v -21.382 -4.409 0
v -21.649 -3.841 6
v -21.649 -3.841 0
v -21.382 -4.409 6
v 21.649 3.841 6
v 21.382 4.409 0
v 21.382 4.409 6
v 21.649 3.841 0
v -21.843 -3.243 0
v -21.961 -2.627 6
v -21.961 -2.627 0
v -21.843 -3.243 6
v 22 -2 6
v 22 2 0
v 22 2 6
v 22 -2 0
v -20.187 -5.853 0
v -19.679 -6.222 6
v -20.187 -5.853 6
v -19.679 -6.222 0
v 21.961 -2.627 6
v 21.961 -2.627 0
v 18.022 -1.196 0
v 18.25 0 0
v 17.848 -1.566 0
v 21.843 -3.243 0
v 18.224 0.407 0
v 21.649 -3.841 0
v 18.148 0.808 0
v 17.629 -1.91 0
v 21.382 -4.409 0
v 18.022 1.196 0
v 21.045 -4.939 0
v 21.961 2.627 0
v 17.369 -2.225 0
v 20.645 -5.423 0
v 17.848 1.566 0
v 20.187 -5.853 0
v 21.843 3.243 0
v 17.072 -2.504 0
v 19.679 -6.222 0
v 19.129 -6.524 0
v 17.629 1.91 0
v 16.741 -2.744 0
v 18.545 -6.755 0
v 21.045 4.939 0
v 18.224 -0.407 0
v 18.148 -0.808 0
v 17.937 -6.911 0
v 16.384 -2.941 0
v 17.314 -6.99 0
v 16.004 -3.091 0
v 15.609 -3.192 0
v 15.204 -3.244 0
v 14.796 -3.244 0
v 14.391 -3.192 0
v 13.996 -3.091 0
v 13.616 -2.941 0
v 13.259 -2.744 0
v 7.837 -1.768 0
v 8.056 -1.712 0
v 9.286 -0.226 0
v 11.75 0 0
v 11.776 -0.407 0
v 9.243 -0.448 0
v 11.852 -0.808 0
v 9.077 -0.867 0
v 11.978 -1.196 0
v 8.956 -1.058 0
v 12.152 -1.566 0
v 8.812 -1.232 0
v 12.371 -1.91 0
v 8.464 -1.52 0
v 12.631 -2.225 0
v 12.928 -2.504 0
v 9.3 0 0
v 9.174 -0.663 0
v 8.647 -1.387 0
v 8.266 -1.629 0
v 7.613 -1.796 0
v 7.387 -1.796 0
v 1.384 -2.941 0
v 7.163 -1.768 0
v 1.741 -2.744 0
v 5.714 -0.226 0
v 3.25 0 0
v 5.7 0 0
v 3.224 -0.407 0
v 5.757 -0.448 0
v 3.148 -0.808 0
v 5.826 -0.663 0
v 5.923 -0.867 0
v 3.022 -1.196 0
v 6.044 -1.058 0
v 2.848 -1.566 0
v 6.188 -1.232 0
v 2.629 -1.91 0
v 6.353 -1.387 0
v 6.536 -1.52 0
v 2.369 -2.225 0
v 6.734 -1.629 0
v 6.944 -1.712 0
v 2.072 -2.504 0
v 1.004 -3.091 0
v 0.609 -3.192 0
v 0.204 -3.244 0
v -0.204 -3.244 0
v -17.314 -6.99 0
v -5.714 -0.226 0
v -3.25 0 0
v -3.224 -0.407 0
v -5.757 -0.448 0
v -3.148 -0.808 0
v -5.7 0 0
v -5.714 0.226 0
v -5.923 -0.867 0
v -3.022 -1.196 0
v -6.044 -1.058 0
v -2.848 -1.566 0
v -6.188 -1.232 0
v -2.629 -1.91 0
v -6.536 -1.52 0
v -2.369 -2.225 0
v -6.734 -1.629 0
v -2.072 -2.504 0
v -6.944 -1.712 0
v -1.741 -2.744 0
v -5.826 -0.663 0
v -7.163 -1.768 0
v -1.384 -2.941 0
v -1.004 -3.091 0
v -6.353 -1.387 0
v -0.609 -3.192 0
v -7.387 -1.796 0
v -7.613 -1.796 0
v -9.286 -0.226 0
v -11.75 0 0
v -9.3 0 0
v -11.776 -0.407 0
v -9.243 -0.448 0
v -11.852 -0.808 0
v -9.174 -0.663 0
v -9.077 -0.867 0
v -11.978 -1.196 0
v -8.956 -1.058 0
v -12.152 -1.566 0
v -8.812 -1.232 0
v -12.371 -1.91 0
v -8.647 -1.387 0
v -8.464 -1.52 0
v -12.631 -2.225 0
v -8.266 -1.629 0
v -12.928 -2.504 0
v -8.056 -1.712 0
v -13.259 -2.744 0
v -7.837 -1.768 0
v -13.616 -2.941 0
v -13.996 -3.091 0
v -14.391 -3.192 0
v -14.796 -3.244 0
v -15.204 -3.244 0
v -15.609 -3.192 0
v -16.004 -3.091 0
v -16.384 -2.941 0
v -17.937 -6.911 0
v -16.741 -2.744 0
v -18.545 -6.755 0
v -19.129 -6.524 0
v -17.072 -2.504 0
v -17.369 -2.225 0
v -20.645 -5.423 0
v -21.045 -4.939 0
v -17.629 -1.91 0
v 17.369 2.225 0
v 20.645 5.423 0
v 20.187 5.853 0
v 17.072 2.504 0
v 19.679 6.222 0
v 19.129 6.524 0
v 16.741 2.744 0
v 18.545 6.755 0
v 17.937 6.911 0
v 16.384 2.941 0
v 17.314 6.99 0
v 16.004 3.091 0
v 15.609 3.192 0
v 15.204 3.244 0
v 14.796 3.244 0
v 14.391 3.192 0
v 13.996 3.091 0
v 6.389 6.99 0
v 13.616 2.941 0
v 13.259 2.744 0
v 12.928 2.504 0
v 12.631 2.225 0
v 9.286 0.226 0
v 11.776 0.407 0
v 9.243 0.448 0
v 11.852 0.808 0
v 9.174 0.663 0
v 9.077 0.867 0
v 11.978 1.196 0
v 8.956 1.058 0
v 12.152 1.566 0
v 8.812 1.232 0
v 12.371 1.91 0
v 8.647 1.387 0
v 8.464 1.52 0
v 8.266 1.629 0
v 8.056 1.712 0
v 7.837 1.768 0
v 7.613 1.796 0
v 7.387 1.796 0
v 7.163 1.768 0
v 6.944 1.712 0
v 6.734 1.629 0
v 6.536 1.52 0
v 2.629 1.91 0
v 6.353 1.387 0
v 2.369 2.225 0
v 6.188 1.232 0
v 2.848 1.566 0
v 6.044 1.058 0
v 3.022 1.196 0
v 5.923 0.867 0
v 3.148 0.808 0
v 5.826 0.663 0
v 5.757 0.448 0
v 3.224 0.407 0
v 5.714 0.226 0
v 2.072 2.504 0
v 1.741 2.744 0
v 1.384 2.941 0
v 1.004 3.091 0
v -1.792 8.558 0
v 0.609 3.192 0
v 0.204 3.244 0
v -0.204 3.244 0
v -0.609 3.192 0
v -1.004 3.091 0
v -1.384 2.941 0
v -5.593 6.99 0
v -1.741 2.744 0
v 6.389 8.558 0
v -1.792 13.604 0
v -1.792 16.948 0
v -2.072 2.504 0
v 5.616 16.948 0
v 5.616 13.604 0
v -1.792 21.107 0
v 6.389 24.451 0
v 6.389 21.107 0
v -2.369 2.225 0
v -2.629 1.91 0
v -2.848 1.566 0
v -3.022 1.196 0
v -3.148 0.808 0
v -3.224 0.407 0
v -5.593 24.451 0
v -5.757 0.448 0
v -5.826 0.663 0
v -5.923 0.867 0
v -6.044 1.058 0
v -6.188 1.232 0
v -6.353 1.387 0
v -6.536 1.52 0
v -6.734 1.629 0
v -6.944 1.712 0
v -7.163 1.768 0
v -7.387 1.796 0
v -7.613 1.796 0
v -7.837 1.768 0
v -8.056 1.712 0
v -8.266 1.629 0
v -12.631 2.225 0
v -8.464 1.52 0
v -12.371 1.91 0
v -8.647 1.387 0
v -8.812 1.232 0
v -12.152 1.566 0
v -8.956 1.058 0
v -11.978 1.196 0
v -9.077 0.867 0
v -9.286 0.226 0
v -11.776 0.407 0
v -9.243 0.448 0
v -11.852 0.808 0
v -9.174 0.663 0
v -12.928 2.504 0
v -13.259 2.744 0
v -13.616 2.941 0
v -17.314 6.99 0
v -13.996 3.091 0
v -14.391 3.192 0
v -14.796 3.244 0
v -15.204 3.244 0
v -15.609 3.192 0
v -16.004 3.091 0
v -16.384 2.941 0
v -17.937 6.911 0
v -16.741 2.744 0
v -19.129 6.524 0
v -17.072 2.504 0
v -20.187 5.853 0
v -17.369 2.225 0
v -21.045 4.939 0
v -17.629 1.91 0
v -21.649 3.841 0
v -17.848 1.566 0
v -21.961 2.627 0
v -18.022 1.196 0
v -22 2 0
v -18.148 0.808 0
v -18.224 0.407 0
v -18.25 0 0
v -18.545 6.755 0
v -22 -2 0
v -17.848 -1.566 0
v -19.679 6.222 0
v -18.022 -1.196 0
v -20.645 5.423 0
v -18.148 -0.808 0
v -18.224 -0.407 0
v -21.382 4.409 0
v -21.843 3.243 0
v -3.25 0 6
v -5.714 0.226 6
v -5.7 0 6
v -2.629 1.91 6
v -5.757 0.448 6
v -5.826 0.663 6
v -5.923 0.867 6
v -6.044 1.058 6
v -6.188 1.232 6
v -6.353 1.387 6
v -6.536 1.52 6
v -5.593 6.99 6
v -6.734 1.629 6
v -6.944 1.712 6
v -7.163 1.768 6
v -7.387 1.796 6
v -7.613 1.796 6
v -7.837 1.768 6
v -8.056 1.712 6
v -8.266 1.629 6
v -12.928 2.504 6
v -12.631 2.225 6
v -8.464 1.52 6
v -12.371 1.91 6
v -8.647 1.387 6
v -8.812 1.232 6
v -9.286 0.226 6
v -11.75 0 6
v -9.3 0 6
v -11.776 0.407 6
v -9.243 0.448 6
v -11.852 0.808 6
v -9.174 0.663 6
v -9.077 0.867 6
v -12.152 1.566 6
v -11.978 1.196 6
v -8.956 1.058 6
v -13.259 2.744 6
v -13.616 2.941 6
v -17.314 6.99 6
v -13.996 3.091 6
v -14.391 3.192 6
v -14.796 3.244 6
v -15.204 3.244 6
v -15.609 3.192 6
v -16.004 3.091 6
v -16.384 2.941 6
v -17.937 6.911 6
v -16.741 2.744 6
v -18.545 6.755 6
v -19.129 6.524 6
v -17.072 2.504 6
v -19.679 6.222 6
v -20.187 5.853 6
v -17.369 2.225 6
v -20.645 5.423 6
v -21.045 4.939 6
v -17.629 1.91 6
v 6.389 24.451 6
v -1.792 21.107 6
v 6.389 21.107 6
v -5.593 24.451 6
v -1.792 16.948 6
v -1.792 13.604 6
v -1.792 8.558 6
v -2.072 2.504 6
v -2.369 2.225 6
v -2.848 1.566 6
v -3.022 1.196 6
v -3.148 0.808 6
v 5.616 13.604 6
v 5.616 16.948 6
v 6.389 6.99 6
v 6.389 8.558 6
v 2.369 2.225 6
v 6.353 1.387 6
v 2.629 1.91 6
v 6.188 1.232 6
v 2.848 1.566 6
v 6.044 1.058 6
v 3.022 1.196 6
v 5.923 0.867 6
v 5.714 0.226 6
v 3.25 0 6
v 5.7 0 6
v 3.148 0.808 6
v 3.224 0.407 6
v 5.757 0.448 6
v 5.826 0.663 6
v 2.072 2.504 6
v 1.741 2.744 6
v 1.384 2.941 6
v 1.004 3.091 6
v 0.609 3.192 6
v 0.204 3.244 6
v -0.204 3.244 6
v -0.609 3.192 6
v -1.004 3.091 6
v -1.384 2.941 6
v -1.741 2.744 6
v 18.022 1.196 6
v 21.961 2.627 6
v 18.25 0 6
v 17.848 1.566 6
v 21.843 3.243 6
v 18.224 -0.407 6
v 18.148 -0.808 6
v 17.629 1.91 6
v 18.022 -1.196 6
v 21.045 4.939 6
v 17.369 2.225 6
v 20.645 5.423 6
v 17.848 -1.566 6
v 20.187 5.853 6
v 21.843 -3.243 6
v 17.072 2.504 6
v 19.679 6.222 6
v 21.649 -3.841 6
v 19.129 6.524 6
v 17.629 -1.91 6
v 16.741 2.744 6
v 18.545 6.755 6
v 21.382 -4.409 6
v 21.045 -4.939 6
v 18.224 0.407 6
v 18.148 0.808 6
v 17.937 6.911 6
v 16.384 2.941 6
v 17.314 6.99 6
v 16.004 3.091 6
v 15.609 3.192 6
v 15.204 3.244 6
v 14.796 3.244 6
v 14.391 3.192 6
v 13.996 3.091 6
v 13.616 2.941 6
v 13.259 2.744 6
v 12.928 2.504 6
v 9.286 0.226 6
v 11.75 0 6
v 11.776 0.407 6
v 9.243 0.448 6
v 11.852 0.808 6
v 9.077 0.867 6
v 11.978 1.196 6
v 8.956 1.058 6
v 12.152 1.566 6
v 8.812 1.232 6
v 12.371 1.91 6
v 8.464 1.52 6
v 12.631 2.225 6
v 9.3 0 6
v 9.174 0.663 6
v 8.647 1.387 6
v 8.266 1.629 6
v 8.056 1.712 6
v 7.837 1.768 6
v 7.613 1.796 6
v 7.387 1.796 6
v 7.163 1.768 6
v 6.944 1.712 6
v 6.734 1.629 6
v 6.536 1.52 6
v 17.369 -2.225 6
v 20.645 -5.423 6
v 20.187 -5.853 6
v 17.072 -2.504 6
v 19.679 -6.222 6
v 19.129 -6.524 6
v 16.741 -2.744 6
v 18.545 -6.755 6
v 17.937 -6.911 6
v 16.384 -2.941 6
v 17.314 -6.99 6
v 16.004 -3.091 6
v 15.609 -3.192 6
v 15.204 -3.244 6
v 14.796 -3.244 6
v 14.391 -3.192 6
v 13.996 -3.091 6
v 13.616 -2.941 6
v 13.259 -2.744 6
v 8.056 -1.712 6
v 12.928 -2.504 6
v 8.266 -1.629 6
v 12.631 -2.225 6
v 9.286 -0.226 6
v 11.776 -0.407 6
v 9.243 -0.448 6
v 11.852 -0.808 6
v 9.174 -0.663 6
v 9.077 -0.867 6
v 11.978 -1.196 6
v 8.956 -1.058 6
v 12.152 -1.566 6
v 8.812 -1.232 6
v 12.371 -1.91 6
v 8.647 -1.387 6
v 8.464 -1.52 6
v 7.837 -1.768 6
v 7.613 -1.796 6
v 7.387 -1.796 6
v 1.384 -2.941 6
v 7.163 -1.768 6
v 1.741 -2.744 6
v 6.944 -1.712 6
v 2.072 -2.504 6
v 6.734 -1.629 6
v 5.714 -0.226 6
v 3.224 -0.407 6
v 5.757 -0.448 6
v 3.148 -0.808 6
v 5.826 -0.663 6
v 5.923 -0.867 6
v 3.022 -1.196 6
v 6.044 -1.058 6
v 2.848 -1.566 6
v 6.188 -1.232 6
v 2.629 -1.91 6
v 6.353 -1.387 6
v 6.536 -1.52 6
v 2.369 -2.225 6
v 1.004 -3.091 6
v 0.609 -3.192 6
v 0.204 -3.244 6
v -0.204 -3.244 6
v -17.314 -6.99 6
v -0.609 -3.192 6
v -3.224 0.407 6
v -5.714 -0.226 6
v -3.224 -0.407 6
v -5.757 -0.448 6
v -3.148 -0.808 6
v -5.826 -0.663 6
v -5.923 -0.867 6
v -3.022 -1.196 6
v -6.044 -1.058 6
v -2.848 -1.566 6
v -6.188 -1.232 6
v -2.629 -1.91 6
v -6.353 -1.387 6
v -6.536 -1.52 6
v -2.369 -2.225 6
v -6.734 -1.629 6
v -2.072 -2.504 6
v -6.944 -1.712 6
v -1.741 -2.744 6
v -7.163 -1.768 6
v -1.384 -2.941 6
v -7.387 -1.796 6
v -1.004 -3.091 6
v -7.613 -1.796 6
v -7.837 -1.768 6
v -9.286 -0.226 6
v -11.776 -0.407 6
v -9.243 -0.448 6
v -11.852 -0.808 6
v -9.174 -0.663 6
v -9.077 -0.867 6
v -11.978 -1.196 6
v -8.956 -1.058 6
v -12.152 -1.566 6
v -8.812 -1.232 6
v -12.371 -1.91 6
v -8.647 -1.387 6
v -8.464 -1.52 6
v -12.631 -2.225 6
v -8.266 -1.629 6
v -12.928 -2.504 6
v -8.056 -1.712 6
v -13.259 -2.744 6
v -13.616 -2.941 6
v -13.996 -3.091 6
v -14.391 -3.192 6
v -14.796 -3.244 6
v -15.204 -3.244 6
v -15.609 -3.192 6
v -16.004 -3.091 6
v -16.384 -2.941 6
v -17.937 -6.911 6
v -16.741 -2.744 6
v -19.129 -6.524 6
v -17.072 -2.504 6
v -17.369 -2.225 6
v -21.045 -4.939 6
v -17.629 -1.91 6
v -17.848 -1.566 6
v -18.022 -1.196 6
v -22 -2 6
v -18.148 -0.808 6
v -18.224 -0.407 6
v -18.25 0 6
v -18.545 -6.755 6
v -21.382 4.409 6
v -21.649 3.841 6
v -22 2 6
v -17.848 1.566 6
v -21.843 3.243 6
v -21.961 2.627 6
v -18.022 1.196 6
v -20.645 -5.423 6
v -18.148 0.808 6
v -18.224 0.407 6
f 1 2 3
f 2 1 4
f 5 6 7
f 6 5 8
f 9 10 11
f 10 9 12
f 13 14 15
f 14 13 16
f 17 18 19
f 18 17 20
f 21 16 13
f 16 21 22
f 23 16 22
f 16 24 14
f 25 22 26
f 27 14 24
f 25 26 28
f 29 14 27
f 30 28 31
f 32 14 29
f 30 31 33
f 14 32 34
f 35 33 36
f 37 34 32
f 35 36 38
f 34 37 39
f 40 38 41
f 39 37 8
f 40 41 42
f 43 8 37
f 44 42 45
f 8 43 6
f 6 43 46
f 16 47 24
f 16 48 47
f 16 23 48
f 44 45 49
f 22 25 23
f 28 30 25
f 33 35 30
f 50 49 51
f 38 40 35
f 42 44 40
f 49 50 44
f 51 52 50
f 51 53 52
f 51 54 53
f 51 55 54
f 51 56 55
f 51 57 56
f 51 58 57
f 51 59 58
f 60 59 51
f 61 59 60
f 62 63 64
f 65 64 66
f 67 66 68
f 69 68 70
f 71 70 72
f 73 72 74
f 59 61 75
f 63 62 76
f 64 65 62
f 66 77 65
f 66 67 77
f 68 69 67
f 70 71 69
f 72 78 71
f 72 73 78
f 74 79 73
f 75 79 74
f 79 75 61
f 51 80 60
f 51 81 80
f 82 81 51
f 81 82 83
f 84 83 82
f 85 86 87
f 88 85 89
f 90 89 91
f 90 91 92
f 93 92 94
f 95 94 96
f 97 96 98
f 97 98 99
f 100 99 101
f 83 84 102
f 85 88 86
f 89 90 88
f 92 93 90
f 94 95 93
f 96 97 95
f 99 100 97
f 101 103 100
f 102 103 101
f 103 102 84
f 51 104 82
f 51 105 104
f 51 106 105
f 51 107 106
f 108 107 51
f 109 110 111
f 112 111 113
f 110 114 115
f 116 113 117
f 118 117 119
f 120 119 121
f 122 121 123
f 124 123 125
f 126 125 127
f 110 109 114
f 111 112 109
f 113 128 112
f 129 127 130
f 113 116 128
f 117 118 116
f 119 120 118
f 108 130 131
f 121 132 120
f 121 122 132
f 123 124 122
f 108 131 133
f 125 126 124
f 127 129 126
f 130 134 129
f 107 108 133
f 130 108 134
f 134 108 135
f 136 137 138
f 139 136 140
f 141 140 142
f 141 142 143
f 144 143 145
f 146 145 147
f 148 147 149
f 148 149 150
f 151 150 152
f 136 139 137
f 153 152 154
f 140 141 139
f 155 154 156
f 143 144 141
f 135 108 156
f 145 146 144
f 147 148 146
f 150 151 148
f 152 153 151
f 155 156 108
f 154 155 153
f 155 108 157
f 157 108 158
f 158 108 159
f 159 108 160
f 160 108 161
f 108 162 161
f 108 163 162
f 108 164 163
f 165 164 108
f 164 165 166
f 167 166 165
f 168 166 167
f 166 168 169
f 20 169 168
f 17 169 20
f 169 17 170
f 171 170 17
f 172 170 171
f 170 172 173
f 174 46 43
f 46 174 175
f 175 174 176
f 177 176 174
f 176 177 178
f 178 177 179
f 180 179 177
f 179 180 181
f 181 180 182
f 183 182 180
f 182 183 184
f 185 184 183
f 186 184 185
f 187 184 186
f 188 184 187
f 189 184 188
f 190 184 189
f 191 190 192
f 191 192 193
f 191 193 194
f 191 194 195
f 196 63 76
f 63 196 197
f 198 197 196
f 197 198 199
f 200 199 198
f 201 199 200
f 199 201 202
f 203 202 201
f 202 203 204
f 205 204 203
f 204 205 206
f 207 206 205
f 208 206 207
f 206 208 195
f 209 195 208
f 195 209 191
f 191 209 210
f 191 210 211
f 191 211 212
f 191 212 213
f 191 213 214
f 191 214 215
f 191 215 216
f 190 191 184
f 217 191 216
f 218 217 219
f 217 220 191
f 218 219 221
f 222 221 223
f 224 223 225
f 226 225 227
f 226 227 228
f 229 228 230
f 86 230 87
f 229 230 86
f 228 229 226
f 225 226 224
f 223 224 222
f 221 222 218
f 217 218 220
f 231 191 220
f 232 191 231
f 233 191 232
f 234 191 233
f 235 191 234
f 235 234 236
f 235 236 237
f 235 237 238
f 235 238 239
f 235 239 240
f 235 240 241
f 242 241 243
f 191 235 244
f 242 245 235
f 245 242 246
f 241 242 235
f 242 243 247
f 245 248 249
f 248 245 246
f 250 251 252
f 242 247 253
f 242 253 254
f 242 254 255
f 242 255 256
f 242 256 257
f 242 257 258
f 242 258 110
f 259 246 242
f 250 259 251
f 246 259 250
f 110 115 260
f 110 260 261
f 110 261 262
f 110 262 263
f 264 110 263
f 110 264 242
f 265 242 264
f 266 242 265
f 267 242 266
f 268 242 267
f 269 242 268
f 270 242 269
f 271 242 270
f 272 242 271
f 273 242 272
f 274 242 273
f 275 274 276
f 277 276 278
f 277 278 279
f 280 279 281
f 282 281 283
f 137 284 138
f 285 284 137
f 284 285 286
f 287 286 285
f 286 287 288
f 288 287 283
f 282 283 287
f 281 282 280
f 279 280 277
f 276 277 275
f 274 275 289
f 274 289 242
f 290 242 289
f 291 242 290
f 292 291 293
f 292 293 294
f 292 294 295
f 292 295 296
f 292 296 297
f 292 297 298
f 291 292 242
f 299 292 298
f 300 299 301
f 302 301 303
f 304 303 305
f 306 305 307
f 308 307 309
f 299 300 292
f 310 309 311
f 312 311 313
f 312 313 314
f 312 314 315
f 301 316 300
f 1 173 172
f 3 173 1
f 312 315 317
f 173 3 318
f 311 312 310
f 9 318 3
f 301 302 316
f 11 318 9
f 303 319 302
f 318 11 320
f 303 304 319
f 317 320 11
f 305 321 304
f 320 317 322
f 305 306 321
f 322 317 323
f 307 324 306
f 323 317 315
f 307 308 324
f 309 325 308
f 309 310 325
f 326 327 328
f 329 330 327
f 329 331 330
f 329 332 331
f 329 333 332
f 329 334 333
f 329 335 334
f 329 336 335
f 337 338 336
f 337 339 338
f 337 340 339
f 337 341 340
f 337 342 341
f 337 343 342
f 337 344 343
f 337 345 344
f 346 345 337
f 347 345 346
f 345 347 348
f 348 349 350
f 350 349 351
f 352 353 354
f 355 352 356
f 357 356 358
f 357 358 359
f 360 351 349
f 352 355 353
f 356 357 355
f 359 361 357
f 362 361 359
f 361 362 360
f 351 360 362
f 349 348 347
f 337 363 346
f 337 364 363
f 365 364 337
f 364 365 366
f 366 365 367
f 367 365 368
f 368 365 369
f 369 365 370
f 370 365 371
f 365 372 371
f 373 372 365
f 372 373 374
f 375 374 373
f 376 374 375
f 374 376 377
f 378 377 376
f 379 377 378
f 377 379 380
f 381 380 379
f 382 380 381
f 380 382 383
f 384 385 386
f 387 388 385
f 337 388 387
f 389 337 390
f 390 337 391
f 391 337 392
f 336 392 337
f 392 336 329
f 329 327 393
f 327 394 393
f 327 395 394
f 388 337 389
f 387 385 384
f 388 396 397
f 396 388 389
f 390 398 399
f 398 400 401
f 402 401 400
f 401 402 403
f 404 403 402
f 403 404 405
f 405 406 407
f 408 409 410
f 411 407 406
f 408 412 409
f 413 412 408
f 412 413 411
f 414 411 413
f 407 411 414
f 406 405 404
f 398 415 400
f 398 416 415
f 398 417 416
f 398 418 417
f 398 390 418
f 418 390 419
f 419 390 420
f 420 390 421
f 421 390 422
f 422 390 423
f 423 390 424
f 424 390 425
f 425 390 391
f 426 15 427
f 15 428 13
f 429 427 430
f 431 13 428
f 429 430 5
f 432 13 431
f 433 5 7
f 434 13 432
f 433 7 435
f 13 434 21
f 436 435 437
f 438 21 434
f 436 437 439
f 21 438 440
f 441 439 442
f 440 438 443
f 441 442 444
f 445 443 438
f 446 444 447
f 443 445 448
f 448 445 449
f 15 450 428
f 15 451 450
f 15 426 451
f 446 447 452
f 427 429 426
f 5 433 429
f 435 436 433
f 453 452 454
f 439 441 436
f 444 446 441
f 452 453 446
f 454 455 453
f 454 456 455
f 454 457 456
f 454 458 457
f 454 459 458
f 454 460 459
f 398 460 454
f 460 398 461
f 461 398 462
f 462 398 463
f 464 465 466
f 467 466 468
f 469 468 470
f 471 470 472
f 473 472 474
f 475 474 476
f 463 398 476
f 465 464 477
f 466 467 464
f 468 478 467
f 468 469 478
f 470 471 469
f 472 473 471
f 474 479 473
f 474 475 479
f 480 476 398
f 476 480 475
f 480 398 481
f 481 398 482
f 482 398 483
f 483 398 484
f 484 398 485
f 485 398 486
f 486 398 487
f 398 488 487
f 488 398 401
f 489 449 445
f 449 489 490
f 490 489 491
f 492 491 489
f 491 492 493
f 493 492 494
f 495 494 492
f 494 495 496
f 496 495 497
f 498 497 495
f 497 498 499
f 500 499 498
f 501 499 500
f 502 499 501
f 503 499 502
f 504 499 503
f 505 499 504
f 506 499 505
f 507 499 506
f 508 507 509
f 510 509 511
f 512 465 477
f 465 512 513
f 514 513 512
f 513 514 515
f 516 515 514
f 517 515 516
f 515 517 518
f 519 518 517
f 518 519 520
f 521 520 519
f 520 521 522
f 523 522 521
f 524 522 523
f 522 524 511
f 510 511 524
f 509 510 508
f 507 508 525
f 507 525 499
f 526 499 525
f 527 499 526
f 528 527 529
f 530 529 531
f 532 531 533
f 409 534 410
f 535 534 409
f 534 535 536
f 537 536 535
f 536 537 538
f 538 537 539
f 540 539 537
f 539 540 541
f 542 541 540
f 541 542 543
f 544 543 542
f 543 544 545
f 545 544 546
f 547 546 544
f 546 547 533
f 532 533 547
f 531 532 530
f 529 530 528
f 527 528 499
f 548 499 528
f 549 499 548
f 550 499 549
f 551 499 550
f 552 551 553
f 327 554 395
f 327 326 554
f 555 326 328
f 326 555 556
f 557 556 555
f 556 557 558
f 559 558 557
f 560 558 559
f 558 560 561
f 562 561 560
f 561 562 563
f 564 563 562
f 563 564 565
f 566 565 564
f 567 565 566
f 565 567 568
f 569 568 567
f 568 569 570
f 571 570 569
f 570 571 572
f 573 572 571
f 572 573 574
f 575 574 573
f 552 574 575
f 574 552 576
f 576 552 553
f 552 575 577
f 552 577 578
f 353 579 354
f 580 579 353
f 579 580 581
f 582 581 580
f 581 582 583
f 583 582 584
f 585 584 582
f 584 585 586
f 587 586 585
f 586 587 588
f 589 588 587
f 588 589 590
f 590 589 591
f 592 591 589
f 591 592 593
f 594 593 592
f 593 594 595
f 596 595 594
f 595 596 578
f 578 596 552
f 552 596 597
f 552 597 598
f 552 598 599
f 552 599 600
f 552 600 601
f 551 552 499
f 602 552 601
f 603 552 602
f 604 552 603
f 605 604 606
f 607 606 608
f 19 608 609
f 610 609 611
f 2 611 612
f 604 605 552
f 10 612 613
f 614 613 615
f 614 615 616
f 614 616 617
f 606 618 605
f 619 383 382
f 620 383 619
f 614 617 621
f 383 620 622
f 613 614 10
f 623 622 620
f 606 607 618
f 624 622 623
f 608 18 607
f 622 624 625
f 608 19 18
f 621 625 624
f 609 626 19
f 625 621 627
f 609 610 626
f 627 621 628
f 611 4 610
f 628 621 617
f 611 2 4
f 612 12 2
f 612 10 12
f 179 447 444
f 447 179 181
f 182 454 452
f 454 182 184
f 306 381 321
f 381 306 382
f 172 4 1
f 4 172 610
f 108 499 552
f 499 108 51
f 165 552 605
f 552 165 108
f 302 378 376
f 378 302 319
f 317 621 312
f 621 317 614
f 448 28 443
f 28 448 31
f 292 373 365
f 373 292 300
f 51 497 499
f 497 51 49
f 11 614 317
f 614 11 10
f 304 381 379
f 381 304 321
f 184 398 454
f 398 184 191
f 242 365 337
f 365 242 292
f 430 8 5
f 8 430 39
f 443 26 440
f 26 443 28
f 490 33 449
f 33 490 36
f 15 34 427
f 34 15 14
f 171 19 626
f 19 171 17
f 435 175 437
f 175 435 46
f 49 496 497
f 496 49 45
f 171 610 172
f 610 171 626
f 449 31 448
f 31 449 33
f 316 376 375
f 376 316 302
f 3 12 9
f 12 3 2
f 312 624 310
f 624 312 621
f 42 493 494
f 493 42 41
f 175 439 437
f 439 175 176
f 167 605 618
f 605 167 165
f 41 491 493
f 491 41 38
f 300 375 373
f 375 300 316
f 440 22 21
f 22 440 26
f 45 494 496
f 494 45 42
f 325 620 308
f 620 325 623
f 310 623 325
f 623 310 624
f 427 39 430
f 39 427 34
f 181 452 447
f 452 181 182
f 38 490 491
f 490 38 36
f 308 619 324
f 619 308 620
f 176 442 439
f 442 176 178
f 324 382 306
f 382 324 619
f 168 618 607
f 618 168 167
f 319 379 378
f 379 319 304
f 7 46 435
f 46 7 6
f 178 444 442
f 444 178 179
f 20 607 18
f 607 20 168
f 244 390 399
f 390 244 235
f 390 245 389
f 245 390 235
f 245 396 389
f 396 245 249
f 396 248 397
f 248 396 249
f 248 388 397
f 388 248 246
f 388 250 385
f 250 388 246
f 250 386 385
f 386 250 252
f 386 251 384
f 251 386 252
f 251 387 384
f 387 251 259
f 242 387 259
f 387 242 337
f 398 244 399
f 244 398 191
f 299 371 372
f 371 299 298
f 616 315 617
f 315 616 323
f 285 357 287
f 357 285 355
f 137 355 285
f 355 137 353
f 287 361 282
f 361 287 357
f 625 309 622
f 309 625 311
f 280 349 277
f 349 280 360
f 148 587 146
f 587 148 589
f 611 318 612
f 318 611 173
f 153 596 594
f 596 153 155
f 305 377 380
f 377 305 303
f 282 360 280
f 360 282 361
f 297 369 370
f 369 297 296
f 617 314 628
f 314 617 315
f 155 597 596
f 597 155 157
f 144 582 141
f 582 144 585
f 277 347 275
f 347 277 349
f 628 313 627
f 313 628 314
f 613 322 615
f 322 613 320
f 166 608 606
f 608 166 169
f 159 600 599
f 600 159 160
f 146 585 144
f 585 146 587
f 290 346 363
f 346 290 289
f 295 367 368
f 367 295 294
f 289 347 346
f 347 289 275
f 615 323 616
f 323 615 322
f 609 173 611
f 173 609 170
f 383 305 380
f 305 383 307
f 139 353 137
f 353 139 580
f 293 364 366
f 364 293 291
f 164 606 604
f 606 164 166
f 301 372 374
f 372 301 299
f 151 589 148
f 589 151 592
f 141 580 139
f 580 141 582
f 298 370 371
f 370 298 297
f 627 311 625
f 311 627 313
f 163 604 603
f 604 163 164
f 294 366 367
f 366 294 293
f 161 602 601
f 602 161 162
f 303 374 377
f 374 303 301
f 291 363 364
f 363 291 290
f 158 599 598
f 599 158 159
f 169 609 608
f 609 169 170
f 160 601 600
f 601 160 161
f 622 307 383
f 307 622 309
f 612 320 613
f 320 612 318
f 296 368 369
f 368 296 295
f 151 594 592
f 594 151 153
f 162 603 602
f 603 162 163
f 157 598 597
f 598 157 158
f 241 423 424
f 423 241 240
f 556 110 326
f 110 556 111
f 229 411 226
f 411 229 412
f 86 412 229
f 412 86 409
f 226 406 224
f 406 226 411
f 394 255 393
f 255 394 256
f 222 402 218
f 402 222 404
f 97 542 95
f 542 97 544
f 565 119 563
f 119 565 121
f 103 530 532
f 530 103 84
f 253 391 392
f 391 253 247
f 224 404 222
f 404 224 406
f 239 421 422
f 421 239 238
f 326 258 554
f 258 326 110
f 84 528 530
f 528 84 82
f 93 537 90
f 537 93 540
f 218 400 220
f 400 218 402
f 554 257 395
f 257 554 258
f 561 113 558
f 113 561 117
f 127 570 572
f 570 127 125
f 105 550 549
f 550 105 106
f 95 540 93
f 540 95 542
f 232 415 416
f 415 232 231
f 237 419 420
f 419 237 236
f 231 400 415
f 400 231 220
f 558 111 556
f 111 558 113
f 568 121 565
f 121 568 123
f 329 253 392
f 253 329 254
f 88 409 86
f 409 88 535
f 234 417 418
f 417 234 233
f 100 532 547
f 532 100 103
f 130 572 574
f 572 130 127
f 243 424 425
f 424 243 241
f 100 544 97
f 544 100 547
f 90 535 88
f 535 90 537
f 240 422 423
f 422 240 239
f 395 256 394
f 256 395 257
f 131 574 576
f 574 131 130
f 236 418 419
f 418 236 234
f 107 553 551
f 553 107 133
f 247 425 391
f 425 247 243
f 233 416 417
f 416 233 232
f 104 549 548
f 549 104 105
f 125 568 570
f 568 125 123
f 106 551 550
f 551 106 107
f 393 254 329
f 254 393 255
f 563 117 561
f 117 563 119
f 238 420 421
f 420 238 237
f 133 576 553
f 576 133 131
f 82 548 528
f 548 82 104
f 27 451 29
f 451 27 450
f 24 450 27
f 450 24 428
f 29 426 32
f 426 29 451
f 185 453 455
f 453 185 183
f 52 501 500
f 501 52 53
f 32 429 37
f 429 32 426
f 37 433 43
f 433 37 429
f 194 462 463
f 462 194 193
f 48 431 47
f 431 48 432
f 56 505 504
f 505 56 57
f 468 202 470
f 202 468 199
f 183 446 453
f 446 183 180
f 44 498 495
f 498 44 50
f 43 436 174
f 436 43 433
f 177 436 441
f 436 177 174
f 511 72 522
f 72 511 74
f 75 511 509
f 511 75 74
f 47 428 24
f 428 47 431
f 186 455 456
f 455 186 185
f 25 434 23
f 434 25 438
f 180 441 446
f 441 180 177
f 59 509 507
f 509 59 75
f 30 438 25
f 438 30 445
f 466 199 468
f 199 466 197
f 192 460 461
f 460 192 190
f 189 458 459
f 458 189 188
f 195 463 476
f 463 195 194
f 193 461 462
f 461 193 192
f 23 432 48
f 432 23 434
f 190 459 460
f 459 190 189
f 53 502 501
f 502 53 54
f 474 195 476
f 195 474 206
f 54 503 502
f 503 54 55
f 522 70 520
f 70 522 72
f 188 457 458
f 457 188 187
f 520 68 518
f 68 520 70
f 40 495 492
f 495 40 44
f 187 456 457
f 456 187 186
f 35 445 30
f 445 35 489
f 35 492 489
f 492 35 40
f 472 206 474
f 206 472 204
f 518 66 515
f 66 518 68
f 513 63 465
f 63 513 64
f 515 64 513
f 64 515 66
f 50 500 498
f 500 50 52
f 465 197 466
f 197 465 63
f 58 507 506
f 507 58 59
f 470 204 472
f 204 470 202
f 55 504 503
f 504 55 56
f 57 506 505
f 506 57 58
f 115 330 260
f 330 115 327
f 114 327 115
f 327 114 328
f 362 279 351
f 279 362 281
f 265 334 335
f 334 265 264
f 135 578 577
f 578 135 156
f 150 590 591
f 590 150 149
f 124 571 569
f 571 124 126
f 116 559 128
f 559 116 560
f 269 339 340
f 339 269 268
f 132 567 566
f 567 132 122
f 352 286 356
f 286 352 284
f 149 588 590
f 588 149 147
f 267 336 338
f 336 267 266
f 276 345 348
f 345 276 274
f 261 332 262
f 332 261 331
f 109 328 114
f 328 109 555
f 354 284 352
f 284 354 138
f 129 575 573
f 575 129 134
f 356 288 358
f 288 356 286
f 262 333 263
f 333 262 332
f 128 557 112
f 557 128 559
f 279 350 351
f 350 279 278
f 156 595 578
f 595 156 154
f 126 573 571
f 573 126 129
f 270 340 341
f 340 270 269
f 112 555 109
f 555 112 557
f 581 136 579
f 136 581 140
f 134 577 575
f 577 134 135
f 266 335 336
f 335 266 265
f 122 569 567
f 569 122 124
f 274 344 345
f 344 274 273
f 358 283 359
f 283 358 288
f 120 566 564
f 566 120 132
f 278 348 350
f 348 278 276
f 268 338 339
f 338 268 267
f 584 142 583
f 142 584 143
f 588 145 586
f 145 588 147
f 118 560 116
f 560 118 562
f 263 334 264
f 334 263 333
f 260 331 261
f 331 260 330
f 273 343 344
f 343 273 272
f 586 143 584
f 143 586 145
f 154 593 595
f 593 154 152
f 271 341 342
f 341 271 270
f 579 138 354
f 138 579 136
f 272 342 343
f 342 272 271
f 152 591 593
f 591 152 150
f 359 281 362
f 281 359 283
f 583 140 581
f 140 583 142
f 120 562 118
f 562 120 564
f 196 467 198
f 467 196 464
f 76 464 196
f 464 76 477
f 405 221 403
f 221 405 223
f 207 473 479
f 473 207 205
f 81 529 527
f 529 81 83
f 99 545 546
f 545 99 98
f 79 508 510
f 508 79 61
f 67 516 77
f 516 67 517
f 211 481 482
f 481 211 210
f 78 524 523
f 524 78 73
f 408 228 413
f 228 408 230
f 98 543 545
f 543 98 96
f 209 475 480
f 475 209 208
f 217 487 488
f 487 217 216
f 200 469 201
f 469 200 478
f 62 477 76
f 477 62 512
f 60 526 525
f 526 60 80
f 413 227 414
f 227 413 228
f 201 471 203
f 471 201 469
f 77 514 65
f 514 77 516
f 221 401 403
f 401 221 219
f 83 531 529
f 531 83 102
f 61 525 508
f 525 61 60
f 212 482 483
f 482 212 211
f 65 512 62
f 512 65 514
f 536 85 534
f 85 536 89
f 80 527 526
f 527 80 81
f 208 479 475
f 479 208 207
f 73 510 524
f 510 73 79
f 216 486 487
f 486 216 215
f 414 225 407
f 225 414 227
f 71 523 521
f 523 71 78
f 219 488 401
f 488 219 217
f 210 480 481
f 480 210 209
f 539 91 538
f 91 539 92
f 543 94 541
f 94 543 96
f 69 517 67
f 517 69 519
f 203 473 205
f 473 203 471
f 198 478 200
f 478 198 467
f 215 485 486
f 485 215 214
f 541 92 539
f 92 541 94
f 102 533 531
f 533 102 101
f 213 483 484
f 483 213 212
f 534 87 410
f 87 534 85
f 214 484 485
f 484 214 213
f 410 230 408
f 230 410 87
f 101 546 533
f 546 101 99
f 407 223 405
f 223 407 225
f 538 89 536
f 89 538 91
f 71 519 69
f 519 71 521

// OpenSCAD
$fn = 50;


difference() {
	union() {
		hull() {
			translate(v = [-17.0000000000, 2.0000000000, 0]) {
				cylinder(h = 6, r = 5);
			}
			translate(v = [17.0000000000, 2.0000000000, 0]) {
				cylinder(h = 6, r = 5);
			}
			translate(v = [-17.0000000000, -2.0000000000, 0]) {
				cylinder(h = 6, r = 5);
			}
			translate(v = [17.0000000000, -2.0000000000, 0]) {
				cylinder(h = 6, r = 5);
			}
		}
		translate(v = [0, 24, 0]) {
			linear_extrude(height = 6) {
				text(font = "DejaVu Sans Mono:style=Bold", halign = "center", size = 19.0000000000, text = "E", valign = "top");
			}
		}
	}
	union() {
		translate(v = [-15.0000000000, 0.0000000000, 0]) {
			translate(v = [0, 0, -100]) {
				cylinder(h = 200, r = 3.2500000000);
			}
		}
		translate(v = [0, 0, -100]) {
			cylinder(h = 200, r = 3.2500000000);
		}
		translate(v = [15.0000000000, 0.0000000000, 0]) {
			translate(v = [0, 0, -100]) {
				cylinder(h = 200, r = 3.2500000000);
			}
		}
		translate(v = [-15.0000000000, 0.0000000000, 0]) {
			translate(v = [0, 0, -100]) {
				cylinder(h = 200, r = 1.8000000000);
			}
		}
		translate(v = [-7.5000000000, 0.0000000000, 0]) {
			translate(v = [0, 0, -100]) {
				cylinder(h = 200, r = 1.8000000000);
			}
		}
		translate(v = [0, 0, -100]) {
			cylinder(h = 200, r = 1.8000000000);
		}
		translate(v = [7.5000000000, 0.0000000000, 0]) {
			translate(v = [0, 0, -100]) {
				cylinder(h = 200, r = 1.8000000000);
			}
		}
		translate(v = [15.0000000000, 0.0000000000, 0]) {
			translate(v = [0, 0, -100]) {
				cylinder(h = 200, r = 1.8000000000);
			}
		}
	}
}
